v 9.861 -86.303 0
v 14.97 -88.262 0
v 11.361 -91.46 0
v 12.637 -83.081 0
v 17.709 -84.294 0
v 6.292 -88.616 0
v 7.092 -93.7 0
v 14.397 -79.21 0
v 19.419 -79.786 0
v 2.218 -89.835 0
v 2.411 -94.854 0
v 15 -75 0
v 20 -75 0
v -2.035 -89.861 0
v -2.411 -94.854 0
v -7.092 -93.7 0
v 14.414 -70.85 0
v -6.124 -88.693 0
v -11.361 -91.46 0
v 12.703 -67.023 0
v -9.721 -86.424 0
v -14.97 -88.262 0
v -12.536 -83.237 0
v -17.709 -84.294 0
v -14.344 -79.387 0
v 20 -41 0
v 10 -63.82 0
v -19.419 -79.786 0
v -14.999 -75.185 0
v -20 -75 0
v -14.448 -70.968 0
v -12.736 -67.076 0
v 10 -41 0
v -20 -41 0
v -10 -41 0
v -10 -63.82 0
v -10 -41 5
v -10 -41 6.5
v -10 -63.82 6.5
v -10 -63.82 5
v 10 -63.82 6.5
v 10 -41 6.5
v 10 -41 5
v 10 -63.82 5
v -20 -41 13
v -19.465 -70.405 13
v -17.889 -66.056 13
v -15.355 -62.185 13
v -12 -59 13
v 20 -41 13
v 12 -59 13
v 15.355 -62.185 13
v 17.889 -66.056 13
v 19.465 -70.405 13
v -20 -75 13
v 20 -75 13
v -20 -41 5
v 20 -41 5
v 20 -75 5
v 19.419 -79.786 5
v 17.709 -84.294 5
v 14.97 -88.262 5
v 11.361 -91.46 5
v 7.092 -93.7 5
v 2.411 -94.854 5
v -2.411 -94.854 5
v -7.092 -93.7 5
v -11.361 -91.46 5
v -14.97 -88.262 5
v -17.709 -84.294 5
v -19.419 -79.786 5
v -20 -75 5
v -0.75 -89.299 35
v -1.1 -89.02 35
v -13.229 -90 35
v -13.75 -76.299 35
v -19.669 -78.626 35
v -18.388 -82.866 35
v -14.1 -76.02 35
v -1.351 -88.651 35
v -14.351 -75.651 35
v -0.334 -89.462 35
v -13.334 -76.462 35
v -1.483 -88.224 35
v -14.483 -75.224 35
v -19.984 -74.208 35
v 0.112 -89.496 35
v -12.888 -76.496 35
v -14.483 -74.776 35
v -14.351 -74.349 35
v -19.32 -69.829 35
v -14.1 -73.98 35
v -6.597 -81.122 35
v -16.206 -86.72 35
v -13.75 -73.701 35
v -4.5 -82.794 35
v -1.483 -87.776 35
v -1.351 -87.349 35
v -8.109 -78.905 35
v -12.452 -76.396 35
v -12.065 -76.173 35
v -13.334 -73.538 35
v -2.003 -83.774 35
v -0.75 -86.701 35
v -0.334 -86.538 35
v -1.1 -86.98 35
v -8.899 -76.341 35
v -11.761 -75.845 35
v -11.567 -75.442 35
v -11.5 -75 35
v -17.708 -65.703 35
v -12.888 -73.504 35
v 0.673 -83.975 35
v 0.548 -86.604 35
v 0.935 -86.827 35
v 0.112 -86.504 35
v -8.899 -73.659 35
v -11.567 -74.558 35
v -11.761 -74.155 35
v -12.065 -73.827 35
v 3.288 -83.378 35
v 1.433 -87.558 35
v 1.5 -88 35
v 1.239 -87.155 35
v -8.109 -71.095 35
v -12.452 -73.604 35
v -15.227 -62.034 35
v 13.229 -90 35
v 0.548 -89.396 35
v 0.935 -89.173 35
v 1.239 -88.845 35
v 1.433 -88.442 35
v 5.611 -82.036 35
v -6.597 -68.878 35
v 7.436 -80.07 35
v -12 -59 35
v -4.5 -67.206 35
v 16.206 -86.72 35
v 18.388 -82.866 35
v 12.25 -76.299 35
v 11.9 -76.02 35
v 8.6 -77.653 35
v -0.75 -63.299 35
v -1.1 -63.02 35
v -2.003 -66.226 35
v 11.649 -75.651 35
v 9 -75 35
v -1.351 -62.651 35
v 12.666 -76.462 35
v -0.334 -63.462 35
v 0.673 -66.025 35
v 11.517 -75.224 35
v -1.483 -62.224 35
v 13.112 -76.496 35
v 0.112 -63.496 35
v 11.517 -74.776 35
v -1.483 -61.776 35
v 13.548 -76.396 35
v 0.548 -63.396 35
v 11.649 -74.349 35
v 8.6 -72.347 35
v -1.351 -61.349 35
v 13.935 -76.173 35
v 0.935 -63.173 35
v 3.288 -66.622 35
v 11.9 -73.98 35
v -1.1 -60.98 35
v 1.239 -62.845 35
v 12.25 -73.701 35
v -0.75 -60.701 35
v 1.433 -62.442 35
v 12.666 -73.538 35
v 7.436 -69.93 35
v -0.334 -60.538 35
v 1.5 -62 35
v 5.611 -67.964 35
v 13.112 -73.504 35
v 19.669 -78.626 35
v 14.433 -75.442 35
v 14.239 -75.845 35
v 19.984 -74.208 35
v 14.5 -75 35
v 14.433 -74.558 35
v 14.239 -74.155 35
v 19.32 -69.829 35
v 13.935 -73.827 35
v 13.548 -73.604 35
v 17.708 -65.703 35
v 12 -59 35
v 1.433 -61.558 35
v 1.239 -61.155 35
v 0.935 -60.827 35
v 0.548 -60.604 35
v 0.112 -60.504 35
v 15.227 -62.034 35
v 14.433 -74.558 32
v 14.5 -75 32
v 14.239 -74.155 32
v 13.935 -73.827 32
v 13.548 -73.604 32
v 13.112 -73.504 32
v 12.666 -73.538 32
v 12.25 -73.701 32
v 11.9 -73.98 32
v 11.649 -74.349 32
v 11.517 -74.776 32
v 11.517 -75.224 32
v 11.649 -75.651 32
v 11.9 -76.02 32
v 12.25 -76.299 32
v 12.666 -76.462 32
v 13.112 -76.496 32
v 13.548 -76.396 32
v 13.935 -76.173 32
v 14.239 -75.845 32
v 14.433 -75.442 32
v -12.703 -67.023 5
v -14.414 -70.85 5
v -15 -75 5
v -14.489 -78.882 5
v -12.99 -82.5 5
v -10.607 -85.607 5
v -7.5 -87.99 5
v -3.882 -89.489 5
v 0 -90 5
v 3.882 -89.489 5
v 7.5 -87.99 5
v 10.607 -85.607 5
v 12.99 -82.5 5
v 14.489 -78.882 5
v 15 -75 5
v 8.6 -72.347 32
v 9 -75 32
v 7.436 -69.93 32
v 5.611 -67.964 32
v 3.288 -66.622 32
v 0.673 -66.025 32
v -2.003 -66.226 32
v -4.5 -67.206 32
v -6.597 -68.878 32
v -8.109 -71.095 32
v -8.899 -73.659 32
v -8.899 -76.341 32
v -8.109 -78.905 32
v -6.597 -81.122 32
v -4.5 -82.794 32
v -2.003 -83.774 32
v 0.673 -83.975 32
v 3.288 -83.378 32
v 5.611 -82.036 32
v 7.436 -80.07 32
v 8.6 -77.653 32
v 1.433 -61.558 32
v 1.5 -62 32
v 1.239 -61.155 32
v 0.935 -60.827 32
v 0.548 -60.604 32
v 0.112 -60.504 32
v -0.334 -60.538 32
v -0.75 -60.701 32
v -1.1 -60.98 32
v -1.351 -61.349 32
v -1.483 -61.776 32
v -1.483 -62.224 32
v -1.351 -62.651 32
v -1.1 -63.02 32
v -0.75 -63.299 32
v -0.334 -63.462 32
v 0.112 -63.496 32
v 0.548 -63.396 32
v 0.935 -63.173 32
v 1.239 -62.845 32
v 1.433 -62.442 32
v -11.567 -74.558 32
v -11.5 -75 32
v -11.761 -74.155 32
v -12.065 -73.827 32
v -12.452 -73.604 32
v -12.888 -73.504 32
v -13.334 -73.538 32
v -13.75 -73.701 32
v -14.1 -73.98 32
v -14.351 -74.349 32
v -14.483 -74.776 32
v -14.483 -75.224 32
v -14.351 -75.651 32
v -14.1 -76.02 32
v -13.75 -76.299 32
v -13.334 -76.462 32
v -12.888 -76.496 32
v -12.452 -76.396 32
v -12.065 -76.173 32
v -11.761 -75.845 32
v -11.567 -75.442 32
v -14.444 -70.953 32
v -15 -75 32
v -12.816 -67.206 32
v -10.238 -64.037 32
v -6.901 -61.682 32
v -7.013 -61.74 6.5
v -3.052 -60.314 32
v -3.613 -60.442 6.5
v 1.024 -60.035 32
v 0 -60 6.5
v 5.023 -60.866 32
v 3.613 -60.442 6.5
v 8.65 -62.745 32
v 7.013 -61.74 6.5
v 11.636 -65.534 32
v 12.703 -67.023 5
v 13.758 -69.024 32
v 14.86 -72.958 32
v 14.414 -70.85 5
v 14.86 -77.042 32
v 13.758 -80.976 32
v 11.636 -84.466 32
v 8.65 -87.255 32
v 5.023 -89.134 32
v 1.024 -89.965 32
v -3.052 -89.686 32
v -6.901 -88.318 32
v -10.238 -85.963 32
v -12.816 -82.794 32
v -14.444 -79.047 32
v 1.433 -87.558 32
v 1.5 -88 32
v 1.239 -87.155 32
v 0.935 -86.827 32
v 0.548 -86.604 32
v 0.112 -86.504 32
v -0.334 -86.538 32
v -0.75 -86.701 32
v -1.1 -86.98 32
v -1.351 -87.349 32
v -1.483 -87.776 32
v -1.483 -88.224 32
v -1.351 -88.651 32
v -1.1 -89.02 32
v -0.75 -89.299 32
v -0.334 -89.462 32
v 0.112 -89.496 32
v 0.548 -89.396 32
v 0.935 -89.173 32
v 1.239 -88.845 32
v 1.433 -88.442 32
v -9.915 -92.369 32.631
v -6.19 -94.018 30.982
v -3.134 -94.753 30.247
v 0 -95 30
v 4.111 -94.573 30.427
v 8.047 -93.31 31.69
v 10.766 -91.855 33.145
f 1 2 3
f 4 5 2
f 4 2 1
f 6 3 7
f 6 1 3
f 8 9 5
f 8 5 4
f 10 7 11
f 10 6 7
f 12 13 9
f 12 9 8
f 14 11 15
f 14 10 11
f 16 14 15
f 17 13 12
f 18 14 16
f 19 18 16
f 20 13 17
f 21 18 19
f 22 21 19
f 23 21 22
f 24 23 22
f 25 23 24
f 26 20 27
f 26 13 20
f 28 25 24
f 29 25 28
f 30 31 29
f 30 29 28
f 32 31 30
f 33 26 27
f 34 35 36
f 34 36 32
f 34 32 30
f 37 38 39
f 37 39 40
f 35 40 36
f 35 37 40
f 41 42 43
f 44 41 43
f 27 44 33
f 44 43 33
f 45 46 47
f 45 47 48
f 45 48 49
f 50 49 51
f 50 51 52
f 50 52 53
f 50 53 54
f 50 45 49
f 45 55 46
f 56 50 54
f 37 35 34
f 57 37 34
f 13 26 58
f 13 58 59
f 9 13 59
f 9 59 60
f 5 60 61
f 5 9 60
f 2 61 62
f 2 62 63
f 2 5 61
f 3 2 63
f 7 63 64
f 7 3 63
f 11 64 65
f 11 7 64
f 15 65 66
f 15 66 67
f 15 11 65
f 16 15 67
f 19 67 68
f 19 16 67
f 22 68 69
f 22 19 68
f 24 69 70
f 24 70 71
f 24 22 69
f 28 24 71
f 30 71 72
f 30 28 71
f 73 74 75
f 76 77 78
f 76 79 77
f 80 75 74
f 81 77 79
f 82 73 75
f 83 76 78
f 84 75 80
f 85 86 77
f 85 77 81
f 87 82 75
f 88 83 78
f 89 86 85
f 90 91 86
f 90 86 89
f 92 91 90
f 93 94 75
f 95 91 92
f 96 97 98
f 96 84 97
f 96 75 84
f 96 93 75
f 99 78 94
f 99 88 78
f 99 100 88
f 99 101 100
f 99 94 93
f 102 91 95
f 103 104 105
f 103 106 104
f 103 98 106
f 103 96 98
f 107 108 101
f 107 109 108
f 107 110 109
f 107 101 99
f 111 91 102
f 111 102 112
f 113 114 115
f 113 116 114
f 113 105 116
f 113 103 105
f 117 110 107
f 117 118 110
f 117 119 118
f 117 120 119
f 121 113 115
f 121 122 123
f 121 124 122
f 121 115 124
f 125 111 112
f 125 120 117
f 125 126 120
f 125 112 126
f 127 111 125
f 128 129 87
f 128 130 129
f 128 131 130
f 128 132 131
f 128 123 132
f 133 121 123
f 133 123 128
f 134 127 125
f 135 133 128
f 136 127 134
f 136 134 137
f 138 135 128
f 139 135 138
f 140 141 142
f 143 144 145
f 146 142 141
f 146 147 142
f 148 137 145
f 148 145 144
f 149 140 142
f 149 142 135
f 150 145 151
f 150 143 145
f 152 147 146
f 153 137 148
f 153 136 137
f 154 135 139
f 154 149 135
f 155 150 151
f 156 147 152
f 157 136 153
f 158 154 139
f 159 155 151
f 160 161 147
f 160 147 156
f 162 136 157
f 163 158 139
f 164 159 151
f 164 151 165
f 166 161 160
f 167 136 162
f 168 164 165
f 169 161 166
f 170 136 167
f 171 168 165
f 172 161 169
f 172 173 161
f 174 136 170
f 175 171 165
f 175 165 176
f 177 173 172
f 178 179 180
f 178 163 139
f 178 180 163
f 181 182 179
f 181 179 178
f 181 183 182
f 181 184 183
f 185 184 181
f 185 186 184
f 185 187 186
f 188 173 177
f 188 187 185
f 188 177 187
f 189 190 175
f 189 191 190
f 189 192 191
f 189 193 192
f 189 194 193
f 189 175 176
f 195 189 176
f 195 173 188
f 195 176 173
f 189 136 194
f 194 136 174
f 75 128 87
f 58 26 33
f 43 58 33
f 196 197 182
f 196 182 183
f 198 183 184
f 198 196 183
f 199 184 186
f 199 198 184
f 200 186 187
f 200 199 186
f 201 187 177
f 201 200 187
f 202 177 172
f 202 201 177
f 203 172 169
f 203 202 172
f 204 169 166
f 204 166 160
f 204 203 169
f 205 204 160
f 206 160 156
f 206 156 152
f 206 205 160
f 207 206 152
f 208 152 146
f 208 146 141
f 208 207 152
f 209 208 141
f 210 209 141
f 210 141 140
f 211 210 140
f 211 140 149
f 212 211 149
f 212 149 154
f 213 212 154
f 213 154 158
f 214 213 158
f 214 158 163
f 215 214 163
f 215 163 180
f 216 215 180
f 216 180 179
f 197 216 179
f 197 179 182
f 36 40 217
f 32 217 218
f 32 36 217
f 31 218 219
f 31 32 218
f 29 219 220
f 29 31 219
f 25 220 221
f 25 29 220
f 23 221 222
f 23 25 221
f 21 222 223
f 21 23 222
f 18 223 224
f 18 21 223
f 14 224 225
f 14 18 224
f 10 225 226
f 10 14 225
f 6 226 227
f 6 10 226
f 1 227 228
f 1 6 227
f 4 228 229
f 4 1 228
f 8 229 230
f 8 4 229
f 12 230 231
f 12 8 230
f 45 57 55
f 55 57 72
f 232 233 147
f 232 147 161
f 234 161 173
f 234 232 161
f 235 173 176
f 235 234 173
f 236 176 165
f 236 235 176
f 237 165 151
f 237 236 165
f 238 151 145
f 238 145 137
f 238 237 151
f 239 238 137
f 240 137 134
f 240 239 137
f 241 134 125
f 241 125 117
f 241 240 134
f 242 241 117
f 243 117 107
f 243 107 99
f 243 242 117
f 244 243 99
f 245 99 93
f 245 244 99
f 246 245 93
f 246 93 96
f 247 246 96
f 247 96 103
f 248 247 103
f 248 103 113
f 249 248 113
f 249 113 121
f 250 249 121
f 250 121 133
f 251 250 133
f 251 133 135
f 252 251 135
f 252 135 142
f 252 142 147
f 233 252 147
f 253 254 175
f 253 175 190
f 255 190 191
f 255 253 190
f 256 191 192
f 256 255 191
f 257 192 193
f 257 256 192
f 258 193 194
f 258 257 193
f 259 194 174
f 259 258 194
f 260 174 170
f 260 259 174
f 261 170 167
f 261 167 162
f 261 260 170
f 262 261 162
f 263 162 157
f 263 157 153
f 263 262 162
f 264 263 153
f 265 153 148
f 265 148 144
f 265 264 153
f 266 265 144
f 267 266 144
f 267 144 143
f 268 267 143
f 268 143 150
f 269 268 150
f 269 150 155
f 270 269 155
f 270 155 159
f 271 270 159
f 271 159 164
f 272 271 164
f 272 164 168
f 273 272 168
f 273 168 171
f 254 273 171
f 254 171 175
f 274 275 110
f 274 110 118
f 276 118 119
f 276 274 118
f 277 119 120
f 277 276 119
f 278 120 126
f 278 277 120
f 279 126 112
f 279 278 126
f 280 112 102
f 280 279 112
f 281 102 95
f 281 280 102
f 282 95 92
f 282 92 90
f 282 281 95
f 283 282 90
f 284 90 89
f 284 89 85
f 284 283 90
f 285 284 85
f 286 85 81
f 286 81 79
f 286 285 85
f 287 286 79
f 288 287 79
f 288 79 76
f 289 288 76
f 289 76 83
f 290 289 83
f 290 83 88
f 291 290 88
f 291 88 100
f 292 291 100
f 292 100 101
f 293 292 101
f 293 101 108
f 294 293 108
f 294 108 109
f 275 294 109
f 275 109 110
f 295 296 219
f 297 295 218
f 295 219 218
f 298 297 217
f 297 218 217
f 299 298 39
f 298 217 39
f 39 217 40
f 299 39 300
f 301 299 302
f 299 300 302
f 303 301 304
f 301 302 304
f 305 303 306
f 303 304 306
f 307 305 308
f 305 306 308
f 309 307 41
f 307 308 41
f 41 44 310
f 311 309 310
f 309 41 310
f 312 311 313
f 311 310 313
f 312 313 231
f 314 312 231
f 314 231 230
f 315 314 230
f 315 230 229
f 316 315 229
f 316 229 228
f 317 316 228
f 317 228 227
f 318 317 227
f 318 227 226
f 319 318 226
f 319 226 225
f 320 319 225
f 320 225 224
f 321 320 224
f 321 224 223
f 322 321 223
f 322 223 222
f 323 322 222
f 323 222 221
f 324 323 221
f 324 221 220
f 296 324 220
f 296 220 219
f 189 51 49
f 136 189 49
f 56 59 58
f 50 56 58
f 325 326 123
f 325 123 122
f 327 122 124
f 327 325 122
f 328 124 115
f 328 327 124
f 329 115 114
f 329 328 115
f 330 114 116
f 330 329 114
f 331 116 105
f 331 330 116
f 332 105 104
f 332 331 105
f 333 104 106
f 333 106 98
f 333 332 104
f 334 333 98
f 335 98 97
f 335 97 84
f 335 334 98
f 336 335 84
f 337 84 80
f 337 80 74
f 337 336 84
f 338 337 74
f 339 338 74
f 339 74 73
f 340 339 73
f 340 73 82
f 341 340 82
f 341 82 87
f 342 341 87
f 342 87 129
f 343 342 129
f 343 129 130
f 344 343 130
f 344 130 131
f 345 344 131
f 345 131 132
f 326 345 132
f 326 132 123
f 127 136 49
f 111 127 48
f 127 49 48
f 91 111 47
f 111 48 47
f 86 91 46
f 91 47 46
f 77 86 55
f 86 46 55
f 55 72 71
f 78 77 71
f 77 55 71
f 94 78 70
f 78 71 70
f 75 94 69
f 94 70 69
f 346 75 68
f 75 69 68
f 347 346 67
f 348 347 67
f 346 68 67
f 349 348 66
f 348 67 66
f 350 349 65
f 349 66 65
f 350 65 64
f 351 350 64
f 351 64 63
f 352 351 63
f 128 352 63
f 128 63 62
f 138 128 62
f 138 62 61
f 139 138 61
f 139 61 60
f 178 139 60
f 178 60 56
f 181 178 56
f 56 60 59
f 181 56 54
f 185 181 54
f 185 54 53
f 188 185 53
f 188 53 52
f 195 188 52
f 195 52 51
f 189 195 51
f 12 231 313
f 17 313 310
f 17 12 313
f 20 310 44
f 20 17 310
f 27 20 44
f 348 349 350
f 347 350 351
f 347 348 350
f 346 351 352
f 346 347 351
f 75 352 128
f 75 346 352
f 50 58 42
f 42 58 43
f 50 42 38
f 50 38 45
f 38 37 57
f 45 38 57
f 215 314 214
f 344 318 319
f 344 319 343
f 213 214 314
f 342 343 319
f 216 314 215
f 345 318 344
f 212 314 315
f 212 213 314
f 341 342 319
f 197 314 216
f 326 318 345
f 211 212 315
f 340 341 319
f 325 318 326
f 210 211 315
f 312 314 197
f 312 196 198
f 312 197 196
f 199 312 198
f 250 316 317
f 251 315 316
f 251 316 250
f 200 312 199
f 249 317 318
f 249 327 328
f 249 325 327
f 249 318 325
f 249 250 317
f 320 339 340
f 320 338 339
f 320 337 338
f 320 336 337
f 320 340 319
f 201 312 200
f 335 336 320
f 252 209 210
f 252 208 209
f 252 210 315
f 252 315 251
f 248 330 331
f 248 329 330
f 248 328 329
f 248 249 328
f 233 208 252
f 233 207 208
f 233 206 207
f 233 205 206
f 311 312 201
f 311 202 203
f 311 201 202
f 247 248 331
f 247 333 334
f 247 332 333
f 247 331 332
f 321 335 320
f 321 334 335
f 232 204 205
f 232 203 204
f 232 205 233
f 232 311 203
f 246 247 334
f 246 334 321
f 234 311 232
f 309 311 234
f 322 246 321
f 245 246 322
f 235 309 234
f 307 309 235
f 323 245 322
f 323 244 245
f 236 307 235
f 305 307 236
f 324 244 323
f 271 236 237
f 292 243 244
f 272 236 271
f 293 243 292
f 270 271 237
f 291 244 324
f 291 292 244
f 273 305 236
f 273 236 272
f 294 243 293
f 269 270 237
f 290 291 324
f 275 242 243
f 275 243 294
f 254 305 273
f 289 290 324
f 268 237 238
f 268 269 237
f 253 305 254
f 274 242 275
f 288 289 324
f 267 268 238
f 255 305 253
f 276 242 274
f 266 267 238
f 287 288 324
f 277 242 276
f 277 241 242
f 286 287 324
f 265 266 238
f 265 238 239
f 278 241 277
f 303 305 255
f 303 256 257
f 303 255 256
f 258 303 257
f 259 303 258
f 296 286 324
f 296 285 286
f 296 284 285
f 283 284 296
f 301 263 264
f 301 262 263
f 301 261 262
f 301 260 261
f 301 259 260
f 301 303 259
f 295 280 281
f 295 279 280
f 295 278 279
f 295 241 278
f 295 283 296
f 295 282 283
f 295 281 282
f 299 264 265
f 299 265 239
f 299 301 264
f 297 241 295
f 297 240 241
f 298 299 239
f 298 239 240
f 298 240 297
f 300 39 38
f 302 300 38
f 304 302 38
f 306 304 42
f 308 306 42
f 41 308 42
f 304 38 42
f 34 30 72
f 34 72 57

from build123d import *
from build123d.topology import SkipClean

# Parameters (mm, degrees)
ESQUISSE1_R           = 15
ESQUISSE1_R_2         = 5
ESQUISSE1_R_3         = 2
EXTRUSION1_DEPTH      = 5
ESQUISSE2_R           = 9
ESQUISSE2_R_2         = 1.5
EXTRUSION2_DEPTH      = 30
ESQUISSE3_R           = 15
EXTRUSION3_DEPTH      = 27
EXTRUSION4_DEPTH      = 104.198837203
EXTRUSION4_DEPTH_BACK = 104.198837203
EXTRUSION5_START      = -10
EXTRUSION5_DEPTH      = 10
EXTRUSION6_START      = 5
EXTRUSION6_DEPTH      = 8
EXTRUSION7_REACH      = 69.387
EXTRUSION7_END_RADIUS = 15
ESQUISSE7_W           = 20
ESQUISSE7_H           = 6.5


# Read off the part's stored shape, not the designer's step: Extrusion6
with BuildPart() as part:
    # Esquisse1 → Extrusion1 (new body)
    with BuildSketch(Plane.XY):
        with BuildLine():
            Line((20, -20), (20, -75))
            ThreePointArc((20, -75), (0, -95), (-20, -75))
            Line((-20, -75), (-20, -20))
            ThreePointArc((-20, -20), (0, 0), (20, -20))
        make_face()
        with Locations((0, -75)):
            Circle(ESQUISSE1_R, mode=Mode.SUBTRACT)
        with Locations((0, -20)):
            Circle(ESQUISSE1_R_2, mode=Mode.SUBTRACT)
        with Locations((-14, -20)):
            Circle(ESQUISSE1_R_3, mode=Mode.SUBTRACT)
        with Locations((-9.899494937, -10.100505063)):
            Circle(ESQUISSE1_R_3, mode=Mode.SUBTRACT)
        with Locations((0, -6)):
            Circle(ESQUISSE1_R_3, mode=Mode.SUBTRACT)
        with Locations((9.899494937, -10.100505063)):
            Circle(ESQUISSE1_R_3, mode=Mode.SUBTRACT)
        with Locations((14, -20)):
            Circle(ESQUISSE1_R_3, mode=Mode.SUBTRACT)
        with Locations((9.899494937, -29.899494937)):
            Circle(ESQUISSE1_R_3, mode=Mode.SUBTRACT)
        with Locations((0, -34)):
            Circle(ESQUISSE1_R_3, mode=Mode.SUBTRACT)
        with Locations((-9.899494937, -29.899494937)):
            Circle(ESQUISSE1_R_3, mode=Mode.SUBTRACT)
    extrude(amount=EXTRUSION1_DEPTH)

    # Esquisse2 → Extrusion2 (add)
    with SkipClean():  # the faces are left unmerged after this step: merging them gives an invalid solid
        with BuildSketch(Plane.XY.offset(5)):
            with BuildLine():
                Line((12, -59), (-12, -59))
                ThreePointArc((-12, -59), (0, -95), (12, -59))
            make_face()
            with Locations((0, -75)):
                Circle(ESQUISSE2_R, mode=Mode.SUBTRACT)
            with Locations((0, -62)):
                Circle(ESQUISSE2_R_2, mode=Mode.SUBTRACT)
            with Locations((0, -88)):
                Circle(ESQUISSE2_R_2, mode=Mode.SUBTRACT)
            with Locations((-13, -75)):
                Circle(ESQUISSE2_R_2, mode=Mode.SUBTRACT)
            with Locations((13, -75)):
                Circle(ESQUISSE2_R_2, mode=Mode.SUBTRACT)
        extrude(amount=EXTRUSION2_DEPTH)

    # Esquisse3 → Extrusion3 (cut)
    with SkipClean():  # the faces are left unmerged after this step: merging them gives an invalid solid
        with BuildSketch(Plane(origin=(0, 0, 5), x_dir=(-1, 0, 0), z_dir=(0, 0, -1))):
            with Locations((0, -75)):
                Circle(ESQUISSE3_R)
        extrude(amount=-EXTRUSION3_DEPTH, mode=Mode.SUBTRACT)

    # Esquisse4 → Extrusion4 (cut, two sides: drawn at the far end of the back side and taken through both)
    with SkipClean():  # the faces are left unmerged after this step: merging them gives an invalid solid
        with BuildSketch(Plane(origin=(0, 0, 0), x_dir=(0, 0, -1), z_dir=(1, 0, 0)).offset(-EXTRUSION4_DEPTH_BACK)):
            Polygon((-35, -95), (-30, -95), (-35, -90), align=None)
        extrude(amount=EXTRUSION4_DEPTH + EXTRUSION4_DEPTH_BACK, mode=Mode.SUBTRACT)

    # Esquisse5 → Extrusion5 (cut)
    with SkipClean():  # the faces are left unmerged after this step: merging them gives an invalid solid
        with BuildSketch(Plane.XY.offset(5).offset(EXTRUSION5_START)):
            with BuildLine():
                Line((20, -41), (-20, -41))
                Line((-20, -41), (-20, -20))
                ThreePointArc((-20, -20), (0, 0), (20, -20))
                Line((20, -20), (20, -41))
            make_face()
        extrude(amount=EXTRUSION5_DEPTH, mode=Mode.SUBTRACT)

    # Extrusion6 outline → Extrusion6 (add)
    with SkipClean():  # the faces are left unmerged after this step: merging them gives an invalid solid
        with BuildSketch(Plane.XY.offset(EXTRUSION6_START)):
            with BuildLine():
                Line((-20, -41), (-20, -75))
                ThreePointArc((-20, -75), (-17.88854382, -66.05572809), (-12, -59))
                Line((-12, -59), (12, -59))
                ThreePointArc((12, -59), (17.88854382, -66.05572809), (20, -75))
                Line((20, -75), (20, -41))
                Line((20, -41), (-20, -41))
            make_face()
        extrude(amount=EXTRUSION6_DEPTH)

    # Extrusion7: up to this cylinder (the profile starts outside it)
    with SkipClean():  # the faces are left unmerged after this step: merging them gives an invalid solid
        extrusion7_end = Plane(origin=(0, -75, 3.25), z_dir=(0, 0, -1)) * Cylinder(EXTRUSION7_END_RADIUS, 169.774, mode=Mode.PRIVATE)
        # Esquisse7 → Extrusion7 (cut, up to the surface)
        with BuildSketch(Plane(origin=(0, -41, 0), x_dir=(1, 0, 0), z_dir=(0, 1, 0)), mode=Mode.PRIVATE) as extrusion7_sk1:
            with Locations((0, -3.25)):
                Rectangle(ESQUISSE7_W, ESQUISSE7_H)
        extrusion7_tool1 = extrude(extrusion7_sk1.sketch, amount=-EXTRUSION7_REACH, mode=Mode.PRIVATE) - extrusion7_end
        add(extrusion7_tool1.solids().sort_by_distance((0, -41, 3.25))[0], mode=Mode.SUBTRACT)


solid = part.part
